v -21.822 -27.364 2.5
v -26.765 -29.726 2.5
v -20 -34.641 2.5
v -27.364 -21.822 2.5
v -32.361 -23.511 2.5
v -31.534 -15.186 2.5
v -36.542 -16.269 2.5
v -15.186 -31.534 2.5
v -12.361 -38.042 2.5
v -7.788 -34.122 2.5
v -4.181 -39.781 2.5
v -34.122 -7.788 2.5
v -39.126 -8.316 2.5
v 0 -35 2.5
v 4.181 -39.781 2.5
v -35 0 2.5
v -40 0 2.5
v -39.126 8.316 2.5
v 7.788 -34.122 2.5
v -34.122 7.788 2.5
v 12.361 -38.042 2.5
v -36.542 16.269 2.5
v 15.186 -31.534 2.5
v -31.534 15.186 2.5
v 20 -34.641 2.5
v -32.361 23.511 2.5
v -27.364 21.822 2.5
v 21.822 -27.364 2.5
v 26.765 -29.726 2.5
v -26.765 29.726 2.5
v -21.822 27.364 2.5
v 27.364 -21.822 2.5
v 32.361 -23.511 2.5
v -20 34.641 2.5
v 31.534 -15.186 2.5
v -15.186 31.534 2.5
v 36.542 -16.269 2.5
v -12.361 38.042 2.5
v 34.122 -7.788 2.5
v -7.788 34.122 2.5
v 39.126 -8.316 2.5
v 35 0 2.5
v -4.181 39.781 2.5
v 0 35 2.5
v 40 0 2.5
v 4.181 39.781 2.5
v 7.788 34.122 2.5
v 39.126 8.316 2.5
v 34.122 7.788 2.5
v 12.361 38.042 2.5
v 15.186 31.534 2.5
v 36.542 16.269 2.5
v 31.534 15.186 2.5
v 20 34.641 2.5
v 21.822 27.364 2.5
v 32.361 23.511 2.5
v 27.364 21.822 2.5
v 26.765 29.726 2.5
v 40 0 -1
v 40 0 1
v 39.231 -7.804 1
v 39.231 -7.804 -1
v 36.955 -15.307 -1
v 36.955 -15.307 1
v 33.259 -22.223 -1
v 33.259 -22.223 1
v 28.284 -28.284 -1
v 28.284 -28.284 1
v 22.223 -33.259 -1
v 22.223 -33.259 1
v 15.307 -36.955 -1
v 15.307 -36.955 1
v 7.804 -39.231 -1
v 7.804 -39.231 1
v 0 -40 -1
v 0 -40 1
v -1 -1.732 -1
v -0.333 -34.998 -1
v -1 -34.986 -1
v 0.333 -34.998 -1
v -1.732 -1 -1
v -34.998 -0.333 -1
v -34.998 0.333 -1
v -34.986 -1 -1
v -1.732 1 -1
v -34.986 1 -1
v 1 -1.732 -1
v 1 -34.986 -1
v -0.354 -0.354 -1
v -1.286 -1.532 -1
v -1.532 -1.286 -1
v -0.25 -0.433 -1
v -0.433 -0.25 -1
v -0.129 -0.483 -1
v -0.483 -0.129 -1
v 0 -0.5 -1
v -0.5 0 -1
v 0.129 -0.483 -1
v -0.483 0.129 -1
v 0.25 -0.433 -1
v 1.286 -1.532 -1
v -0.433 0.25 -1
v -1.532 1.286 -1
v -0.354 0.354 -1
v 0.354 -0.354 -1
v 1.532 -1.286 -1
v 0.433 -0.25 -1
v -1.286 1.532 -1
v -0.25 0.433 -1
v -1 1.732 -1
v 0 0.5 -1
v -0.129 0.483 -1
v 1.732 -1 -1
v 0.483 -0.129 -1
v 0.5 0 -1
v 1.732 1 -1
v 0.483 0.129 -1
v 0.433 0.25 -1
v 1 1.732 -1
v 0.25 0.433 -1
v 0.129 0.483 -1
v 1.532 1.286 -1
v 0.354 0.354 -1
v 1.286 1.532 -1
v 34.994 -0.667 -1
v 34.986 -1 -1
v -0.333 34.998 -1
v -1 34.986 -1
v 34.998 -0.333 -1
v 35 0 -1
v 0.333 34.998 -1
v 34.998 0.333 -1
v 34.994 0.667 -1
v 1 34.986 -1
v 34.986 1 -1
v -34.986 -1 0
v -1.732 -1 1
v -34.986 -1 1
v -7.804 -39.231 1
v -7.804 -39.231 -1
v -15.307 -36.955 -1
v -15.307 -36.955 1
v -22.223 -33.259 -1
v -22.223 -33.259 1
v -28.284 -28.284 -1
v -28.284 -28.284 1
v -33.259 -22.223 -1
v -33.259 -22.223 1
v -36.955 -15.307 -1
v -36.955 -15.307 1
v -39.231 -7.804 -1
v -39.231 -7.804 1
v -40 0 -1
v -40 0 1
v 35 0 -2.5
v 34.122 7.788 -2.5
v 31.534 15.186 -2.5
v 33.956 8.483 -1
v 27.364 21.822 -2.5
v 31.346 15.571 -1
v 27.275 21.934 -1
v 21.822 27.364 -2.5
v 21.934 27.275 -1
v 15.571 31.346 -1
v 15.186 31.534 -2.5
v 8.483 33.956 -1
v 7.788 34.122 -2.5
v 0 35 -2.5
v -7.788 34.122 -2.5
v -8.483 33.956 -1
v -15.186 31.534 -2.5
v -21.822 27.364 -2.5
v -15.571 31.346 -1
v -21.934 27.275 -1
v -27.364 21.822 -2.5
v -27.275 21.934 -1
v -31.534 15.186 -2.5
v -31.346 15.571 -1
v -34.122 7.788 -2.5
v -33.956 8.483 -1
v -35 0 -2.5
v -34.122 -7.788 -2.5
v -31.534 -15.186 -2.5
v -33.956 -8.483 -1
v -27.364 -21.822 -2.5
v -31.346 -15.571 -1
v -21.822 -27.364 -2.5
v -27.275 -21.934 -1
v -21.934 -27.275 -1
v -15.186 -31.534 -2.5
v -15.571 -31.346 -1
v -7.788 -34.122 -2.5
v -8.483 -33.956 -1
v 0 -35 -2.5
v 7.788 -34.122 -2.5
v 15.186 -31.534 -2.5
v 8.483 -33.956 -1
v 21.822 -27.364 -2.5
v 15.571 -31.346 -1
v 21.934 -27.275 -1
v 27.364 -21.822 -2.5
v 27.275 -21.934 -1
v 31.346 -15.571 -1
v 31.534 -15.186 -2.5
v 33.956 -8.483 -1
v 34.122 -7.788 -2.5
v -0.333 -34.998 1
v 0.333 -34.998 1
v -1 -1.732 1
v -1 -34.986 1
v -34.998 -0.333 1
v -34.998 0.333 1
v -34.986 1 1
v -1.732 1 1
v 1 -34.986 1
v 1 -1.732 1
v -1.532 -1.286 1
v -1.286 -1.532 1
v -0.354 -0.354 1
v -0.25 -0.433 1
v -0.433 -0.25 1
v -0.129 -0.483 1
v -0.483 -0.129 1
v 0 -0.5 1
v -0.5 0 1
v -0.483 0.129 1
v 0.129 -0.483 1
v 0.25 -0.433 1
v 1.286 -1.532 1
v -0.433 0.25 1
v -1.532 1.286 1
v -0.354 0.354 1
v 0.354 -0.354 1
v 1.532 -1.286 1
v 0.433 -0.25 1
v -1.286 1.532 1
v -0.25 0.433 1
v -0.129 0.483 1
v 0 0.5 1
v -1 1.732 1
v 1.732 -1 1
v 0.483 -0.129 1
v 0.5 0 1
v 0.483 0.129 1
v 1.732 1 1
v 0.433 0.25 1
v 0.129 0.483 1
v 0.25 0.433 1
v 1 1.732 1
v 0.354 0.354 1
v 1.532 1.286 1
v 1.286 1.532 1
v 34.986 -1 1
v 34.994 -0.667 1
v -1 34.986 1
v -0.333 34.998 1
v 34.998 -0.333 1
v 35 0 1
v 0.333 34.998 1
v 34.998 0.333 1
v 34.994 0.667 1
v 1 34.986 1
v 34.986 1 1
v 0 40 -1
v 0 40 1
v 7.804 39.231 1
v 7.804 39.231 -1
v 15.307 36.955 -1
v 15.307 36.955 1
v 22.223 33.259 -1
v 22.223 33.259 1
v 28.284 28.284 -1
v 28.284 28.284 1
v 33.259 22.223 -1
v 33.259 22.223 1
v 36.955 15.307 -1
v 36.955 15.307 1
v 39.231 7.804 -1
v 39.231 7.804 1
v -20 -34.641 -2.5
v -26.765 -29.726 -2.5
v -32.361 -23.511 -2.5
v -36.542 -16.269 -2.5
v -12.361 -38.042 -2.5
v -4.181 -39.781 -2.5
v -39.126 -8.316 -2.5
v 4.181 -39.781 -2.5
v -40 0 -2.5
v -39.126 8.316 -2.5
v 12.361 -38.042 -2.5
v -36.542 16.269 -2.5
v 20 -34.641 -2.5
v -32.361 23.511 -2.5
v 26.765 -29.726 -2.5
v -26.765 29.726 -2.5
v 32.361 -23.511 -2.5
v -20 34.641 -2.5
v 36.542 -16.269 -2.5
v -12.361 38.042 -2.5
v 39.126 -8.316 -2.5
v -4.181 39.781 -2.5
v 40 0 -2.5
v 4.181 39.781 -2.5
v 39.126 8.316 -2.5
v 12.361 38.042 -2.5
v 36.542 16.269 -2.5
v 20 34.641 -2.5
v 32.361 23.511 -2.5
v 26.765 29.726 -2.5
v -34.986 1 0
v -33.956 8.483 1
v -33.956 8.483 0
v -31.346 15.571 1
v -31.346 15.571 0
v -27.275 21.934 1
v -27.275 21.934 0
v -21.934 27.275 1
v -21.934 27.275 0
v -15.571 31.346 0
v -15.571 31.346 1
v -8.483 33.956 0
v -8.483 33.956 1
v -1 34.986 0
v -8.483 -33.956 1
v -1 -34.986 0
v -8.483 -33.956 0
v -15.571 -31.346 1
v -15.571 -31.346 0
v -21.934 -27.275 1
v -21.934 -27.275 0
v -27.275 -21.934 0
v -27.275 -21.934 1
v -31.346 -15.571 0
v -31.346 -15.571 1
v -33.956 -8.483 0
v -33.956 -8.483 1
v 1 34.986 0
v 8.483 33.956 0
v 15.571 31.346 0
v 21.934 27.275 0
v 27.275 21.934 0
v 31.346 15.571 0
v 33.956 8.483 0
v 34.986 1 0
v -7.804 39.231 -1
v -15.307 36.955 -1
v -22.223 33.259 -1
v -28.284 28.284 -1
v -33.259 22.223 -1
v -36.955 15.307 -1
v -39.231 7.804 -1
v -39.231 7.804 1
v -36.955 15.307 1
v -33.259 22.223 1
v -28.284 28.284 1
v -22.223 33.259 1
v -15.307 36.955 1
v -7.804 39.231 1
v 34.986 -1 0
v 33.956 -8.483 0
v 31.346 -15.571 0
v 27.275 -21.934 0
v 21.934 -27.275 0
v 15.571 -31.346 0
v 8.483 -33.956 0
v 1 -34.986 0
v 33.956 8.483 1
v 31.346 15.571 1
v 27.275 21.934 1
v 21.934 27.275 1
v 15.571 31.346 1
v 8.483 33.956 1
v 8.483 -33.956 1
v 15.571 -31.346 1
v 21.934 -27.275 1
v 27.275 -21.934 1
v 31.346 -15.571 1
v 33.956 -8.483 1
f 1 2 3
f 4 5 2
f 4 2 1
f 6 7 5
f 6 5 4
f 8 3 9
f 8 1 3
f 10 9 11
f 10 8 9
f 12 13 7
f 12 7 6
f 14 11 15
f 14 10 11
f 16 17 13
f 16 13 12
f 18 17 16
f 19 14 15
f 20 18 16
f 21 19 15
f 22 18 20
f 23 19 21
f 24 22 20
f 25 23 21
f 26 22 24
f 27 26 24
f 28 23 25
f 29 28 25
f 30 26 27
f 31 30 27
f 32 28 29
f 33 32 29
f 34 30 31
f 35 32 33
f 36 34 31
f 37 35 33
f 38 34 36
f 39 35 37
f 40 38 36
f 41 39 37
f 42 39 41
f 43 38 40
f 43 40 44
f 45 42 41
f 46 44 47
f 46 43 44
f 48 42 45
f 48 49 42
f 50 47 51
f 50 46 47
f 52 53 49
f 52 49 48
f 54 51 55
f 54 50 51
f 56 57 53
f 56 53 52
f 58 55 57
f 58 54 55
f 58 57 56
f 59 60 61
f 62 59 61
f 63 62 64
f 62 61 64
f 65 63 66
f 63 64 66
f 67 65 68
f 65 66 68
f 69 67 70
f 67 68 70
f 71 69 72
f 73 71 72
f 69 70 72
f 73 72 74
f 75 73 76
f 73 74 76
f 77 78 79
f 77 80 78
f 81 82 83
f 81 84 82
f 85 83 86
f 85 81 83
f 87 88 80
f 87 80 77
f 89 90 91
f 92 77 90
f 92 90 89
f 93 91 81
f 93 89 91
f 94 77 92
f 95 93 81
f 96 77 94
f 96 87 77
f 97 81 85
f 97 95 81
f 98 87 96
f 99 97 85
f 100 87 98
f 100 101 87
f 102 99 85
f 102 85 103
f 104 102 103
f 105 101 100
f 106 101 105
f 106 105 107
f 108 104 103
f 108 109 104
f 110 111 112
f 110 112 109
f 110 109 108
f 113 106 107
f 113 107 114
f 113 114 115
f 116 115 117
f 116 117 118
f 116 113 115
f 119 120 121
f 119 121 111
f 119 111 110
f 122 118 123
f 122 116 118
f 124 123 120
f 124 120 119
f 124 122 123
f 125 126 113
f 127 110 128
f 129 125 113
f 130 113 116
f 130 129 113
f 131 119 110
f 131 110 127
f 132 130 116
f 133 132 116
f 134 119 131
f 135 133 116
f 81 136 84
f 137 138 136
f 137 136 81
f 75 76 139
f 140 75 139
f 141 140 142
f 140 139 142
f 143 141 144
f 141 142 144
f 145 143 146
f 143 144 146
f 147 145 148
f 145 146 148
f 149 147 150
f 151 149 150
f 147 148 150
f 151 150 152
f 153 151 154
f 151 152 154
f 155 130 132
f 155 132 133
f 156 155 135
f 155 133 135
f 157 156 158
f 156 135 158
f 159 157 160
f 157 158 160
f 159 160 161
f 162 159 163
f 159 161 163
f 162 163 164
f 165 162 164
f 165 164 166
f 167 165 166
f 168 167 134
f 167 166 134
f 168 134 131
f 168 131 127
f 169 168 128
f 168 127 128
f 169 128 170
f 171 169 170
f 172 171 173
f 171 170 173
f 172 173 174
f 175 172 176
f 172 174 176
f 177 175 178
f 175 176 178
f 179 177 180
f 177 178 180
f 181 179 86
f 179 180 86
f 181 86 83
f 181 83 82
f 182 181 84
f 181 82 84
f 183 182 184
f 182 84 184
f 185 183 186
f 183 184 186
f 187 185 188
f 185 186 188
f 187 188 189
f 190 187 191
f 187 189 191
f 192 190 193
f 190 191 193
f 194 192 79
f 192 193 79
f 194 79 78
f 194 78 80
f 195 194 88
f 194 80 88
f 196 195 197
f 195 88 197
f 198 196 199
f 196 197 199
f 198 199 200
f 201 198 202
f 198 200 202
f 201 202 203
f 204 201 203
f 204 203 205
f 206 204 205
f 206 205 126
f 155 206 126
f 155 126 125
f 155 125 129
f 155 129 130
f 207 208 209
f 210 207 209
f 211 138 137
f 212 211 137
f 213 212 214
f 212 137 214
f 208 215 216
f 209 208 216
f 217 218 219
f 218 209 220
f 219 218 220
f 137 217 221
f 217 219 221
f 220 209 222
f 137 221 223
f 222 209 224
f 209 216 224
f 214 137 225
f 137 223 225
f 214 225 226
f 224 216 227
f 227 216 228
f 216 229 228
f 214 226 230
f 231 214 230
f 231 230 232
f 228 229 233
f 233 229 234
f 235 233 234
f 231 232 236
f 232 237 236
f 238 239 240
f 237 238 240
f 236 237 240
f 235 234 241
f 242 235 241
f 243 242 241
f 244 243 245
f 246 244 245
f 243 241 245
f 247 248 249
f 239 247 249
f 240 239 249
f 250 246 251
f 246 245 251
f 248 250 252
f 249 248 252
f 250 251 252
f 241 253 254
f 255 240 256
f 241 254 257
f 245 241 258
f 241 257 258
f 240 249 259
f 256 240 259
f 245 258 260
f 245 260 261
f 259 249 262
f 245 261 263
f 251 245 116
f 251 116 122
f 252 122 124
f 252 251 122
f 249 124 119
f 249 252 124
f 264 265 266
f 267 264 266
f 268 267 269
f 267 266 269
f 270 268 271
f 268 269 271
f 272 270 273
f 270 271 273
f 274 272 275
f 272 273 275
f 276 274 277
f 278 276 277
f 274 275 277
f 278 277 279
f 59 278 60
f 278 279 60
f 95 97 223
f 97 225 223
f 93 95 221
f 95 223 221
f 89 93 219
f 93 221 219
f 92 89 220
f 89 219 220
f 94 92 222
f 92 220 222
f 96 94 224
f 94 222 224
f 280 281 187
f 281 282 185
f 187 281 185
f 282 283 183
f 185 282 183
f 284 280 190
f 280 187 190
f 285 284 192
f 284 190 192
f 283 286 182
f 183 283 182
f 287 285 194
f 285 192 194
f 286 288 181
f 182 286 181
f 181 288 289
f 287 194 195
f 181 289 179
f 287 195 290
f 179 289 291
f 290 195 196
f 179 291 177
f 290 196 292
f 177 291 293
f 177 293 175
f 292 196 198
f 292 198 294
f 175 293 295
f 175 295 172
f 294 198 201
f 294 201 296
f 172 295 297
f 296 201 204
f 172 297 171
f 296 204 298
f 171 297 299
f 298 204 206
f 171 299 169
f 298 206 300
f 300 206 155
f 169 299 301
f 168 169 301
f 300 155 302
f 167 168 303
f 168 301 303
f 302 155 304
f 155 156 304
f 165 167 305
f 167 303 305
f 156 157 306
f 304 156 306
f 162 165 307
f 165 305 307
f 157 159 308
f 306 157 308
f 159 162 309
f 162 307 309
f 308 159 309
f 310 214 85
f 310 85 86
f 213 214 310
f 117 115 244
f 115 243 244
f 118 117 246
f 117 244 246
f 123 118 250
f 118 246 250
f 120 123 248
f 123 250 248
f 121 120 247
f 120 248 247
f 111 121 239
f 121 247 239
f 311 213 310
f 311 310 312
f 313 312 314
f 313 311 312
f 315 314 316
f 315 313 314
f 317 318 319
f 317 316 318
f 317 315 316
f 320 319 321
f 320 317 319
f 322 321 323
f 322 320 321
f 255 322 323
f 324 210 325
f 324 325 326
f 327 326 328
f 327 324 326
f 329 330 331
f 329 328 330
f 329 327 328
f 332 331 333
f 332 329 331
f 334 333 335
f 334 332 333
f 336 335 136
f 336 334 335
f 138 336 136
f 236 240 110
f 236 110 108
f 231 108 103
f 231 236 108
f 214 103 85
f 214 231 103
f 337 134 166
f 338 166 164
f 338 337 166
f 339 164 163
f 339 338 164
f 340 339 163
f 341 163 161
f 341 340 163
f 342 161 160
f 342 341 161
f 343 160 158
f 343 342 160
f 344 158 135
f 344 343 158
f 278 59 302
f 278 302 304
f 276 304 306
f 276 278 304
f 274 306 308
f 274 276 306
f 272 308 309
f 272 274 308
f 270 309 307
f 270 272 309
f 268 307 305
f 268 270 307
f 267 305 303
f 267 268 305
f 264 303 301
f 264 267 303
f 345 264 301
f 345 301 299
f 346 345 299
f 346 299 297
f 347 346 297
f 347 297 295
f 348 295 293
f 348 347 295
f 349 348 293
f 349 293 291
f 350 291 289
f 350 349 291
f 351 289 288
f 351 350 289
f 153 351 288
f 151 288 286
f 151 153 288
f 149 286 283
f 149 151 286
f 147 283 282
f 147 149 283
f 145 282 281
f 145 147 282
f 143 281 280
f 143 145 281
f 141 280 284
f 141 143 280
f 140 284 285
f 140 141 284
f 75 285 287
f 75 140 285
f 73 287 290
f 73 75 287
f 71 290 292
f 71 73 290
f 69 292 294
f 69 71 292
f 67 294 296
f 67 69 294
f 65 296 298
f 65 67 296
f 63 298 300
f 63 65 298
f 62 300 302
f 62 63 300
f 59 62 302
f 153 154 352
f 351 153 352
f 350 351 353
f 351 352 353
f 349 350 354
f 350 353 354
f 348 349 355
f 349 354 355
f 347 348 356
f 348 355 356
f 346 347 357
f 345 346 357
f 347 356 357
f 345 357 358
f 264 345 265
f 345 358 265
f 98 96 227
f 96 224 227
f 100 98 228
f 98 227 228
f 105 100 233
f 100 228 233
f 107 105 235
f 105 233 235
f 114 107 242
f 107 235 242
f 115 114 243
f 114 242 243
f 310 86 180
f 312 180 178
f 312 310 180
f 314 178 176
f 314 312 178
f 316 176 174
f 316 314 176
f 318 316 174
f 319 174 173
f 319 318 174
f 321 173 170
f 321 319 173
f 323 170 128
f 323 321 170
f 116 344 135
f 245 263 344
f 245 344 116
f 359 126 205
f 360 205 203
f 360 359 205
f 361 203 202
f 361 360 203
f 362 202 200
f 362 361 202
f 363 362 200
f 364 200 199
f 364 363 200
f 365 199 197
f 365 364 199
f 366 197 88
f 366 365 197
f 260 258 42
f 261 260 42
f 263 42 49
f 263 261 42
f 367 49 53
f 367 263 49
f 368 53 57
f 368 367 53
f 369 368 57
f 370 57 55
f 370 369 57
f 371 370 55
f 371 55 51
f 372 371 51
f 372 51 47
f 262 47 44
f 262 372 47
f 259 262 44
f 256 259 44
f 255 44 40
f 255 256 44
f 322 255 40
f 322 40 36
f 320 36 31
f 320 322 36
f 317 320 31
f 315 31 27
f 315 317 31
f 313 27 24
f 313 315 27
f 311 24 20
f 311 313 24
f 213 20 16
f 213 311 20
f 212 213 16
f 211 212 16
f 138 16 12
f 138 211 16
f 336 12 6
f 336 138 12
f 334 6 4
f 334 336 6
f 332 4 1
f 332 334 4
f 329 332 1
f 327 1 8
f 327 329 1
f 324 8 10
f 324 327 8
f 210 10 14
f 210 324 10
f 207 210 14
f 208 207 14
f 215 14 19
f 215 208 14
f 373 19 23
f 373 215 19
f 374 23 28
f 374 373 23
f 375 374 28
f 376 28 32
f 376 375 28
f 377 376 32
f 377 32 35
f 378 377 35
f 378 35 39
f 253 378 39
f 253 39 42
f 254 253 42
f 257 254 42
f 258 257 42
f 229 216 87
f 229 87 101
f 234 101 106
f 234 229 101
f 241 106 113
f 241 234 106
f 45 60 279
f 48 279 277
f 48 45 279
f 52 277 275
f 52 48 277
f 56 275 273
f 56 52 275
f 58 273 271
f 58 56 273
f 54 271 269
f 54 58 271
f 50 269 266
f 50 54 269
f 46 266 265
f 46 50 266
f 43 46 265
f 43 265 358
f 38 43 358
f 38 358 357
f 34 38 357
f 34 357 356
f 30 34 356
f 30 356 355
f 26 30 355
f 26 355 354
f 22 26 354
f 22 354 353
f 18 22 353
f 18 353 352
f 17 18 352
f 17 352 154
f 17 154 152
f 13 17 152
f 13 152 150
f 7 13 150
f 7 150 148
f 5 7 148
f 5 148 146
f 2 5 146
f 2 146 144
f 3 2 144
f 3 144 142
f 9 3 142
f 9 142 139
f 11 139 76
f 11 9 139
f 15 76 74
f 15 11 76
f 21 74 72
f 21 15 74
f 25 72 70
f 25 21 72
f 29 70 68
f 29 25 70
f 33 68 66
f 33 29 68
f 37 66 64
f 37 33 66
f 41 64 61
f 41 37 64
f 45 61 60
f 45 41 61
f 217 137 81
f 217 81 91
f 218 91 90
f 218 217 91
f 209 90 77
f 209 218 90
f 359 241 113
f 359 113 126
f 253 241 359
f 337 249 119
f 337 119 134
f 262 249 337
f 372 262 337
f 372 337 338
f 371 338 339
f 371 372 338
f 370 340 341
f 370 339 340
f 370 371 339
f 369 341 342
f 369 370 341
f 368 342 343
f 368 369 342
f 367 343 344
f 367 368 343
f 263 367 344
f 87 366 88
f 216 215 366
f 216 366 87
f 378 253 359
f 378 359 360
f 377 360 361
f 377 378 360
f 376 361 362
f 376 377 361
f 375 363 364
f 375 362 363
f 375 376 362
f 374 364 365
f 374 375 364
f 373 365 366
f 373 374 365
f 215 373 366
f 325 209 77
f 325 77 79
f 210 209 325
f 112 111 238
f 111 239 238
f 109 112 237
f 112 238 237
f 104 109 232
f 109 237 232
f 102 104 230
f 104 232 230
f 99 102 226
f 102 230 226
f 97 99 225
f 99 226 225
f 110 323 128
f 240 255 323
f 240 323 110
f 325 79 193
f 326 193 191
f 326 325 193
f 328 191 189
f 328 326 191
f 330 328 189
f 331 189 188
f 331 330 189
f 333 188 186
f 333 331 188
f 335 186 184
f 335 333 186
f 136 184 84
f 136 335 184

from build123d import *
from build123d.topology import SkipClean

# Parameters (mm, degrees)
BOSS_EXTRUDE1_DEPTH = 1
CIRPATTERN1_COUNT   = 4
SKETCH3_R           = 40
SKETCH3_R_2         = 35
BOSS_EXTRUDE2_DEPTH = 2.5


with BuildPart() as part:
    # Sketch1 → Boss-Extrude1 (new, symmetric)
    with BuildSketch(Plane.XY):
        with BuildLine():
            Line((0, 40), (0, 0.5))
            ThreePointArc((0, 0.5), (-0.353553391, 0.353553391), (-0.5, 0))
            Line((-0.5, 0), (-40, 0))
            ThreePointArc((-40, 0), (-28.284271247, 28.284271247), (0, 40))
        make_face()
        with BuildLine():
            Line((-1, 34.985711369), (-1, 1.732050808))
            ThreePointArc((-1, 1.732050808), (-1.414213562, 1.414213562), (-1.732050808, 1))
            Line((-1.732050808, 1), (-34.985711369, 1))
            ThreePointArc((-34.985711369, 1), (-24.748737342, 24.748737342), (-1, 34.985711369))
        make_face(mode=Mode.SUBTRACT)
    boss_extrude1 = extrude(amount=BOSS_EXTRUDE1_DEPTH, both=True)

    # CirPattern1: Boss-Extrude1 ×4 about axis
    cirpattern1_axis = Axis((0, 0, 0), (0, 0, 1))
    for i in range(1, CIRPATTERN1_COUNT):
        add(boss_extrude1.rotate(cirpattern1_axis, i * 360 / CIRPATTERN1_COUNT))

    # Sketch3 → Boss-Extrude2 (add, symmetric)
    with SkipClean():  # the faces are left unmerged after this step: merging them gives an invalid solid
        with BuildSketch(Plane.XY):
            Circle(SKETCH3_R)
            Circle(SKETCH3_R_2, mode=Mode.SUBTRACT)
        extrude(amount=BOSS_EXTRUDE2_DEPTH, both=True)


solid = part.part
